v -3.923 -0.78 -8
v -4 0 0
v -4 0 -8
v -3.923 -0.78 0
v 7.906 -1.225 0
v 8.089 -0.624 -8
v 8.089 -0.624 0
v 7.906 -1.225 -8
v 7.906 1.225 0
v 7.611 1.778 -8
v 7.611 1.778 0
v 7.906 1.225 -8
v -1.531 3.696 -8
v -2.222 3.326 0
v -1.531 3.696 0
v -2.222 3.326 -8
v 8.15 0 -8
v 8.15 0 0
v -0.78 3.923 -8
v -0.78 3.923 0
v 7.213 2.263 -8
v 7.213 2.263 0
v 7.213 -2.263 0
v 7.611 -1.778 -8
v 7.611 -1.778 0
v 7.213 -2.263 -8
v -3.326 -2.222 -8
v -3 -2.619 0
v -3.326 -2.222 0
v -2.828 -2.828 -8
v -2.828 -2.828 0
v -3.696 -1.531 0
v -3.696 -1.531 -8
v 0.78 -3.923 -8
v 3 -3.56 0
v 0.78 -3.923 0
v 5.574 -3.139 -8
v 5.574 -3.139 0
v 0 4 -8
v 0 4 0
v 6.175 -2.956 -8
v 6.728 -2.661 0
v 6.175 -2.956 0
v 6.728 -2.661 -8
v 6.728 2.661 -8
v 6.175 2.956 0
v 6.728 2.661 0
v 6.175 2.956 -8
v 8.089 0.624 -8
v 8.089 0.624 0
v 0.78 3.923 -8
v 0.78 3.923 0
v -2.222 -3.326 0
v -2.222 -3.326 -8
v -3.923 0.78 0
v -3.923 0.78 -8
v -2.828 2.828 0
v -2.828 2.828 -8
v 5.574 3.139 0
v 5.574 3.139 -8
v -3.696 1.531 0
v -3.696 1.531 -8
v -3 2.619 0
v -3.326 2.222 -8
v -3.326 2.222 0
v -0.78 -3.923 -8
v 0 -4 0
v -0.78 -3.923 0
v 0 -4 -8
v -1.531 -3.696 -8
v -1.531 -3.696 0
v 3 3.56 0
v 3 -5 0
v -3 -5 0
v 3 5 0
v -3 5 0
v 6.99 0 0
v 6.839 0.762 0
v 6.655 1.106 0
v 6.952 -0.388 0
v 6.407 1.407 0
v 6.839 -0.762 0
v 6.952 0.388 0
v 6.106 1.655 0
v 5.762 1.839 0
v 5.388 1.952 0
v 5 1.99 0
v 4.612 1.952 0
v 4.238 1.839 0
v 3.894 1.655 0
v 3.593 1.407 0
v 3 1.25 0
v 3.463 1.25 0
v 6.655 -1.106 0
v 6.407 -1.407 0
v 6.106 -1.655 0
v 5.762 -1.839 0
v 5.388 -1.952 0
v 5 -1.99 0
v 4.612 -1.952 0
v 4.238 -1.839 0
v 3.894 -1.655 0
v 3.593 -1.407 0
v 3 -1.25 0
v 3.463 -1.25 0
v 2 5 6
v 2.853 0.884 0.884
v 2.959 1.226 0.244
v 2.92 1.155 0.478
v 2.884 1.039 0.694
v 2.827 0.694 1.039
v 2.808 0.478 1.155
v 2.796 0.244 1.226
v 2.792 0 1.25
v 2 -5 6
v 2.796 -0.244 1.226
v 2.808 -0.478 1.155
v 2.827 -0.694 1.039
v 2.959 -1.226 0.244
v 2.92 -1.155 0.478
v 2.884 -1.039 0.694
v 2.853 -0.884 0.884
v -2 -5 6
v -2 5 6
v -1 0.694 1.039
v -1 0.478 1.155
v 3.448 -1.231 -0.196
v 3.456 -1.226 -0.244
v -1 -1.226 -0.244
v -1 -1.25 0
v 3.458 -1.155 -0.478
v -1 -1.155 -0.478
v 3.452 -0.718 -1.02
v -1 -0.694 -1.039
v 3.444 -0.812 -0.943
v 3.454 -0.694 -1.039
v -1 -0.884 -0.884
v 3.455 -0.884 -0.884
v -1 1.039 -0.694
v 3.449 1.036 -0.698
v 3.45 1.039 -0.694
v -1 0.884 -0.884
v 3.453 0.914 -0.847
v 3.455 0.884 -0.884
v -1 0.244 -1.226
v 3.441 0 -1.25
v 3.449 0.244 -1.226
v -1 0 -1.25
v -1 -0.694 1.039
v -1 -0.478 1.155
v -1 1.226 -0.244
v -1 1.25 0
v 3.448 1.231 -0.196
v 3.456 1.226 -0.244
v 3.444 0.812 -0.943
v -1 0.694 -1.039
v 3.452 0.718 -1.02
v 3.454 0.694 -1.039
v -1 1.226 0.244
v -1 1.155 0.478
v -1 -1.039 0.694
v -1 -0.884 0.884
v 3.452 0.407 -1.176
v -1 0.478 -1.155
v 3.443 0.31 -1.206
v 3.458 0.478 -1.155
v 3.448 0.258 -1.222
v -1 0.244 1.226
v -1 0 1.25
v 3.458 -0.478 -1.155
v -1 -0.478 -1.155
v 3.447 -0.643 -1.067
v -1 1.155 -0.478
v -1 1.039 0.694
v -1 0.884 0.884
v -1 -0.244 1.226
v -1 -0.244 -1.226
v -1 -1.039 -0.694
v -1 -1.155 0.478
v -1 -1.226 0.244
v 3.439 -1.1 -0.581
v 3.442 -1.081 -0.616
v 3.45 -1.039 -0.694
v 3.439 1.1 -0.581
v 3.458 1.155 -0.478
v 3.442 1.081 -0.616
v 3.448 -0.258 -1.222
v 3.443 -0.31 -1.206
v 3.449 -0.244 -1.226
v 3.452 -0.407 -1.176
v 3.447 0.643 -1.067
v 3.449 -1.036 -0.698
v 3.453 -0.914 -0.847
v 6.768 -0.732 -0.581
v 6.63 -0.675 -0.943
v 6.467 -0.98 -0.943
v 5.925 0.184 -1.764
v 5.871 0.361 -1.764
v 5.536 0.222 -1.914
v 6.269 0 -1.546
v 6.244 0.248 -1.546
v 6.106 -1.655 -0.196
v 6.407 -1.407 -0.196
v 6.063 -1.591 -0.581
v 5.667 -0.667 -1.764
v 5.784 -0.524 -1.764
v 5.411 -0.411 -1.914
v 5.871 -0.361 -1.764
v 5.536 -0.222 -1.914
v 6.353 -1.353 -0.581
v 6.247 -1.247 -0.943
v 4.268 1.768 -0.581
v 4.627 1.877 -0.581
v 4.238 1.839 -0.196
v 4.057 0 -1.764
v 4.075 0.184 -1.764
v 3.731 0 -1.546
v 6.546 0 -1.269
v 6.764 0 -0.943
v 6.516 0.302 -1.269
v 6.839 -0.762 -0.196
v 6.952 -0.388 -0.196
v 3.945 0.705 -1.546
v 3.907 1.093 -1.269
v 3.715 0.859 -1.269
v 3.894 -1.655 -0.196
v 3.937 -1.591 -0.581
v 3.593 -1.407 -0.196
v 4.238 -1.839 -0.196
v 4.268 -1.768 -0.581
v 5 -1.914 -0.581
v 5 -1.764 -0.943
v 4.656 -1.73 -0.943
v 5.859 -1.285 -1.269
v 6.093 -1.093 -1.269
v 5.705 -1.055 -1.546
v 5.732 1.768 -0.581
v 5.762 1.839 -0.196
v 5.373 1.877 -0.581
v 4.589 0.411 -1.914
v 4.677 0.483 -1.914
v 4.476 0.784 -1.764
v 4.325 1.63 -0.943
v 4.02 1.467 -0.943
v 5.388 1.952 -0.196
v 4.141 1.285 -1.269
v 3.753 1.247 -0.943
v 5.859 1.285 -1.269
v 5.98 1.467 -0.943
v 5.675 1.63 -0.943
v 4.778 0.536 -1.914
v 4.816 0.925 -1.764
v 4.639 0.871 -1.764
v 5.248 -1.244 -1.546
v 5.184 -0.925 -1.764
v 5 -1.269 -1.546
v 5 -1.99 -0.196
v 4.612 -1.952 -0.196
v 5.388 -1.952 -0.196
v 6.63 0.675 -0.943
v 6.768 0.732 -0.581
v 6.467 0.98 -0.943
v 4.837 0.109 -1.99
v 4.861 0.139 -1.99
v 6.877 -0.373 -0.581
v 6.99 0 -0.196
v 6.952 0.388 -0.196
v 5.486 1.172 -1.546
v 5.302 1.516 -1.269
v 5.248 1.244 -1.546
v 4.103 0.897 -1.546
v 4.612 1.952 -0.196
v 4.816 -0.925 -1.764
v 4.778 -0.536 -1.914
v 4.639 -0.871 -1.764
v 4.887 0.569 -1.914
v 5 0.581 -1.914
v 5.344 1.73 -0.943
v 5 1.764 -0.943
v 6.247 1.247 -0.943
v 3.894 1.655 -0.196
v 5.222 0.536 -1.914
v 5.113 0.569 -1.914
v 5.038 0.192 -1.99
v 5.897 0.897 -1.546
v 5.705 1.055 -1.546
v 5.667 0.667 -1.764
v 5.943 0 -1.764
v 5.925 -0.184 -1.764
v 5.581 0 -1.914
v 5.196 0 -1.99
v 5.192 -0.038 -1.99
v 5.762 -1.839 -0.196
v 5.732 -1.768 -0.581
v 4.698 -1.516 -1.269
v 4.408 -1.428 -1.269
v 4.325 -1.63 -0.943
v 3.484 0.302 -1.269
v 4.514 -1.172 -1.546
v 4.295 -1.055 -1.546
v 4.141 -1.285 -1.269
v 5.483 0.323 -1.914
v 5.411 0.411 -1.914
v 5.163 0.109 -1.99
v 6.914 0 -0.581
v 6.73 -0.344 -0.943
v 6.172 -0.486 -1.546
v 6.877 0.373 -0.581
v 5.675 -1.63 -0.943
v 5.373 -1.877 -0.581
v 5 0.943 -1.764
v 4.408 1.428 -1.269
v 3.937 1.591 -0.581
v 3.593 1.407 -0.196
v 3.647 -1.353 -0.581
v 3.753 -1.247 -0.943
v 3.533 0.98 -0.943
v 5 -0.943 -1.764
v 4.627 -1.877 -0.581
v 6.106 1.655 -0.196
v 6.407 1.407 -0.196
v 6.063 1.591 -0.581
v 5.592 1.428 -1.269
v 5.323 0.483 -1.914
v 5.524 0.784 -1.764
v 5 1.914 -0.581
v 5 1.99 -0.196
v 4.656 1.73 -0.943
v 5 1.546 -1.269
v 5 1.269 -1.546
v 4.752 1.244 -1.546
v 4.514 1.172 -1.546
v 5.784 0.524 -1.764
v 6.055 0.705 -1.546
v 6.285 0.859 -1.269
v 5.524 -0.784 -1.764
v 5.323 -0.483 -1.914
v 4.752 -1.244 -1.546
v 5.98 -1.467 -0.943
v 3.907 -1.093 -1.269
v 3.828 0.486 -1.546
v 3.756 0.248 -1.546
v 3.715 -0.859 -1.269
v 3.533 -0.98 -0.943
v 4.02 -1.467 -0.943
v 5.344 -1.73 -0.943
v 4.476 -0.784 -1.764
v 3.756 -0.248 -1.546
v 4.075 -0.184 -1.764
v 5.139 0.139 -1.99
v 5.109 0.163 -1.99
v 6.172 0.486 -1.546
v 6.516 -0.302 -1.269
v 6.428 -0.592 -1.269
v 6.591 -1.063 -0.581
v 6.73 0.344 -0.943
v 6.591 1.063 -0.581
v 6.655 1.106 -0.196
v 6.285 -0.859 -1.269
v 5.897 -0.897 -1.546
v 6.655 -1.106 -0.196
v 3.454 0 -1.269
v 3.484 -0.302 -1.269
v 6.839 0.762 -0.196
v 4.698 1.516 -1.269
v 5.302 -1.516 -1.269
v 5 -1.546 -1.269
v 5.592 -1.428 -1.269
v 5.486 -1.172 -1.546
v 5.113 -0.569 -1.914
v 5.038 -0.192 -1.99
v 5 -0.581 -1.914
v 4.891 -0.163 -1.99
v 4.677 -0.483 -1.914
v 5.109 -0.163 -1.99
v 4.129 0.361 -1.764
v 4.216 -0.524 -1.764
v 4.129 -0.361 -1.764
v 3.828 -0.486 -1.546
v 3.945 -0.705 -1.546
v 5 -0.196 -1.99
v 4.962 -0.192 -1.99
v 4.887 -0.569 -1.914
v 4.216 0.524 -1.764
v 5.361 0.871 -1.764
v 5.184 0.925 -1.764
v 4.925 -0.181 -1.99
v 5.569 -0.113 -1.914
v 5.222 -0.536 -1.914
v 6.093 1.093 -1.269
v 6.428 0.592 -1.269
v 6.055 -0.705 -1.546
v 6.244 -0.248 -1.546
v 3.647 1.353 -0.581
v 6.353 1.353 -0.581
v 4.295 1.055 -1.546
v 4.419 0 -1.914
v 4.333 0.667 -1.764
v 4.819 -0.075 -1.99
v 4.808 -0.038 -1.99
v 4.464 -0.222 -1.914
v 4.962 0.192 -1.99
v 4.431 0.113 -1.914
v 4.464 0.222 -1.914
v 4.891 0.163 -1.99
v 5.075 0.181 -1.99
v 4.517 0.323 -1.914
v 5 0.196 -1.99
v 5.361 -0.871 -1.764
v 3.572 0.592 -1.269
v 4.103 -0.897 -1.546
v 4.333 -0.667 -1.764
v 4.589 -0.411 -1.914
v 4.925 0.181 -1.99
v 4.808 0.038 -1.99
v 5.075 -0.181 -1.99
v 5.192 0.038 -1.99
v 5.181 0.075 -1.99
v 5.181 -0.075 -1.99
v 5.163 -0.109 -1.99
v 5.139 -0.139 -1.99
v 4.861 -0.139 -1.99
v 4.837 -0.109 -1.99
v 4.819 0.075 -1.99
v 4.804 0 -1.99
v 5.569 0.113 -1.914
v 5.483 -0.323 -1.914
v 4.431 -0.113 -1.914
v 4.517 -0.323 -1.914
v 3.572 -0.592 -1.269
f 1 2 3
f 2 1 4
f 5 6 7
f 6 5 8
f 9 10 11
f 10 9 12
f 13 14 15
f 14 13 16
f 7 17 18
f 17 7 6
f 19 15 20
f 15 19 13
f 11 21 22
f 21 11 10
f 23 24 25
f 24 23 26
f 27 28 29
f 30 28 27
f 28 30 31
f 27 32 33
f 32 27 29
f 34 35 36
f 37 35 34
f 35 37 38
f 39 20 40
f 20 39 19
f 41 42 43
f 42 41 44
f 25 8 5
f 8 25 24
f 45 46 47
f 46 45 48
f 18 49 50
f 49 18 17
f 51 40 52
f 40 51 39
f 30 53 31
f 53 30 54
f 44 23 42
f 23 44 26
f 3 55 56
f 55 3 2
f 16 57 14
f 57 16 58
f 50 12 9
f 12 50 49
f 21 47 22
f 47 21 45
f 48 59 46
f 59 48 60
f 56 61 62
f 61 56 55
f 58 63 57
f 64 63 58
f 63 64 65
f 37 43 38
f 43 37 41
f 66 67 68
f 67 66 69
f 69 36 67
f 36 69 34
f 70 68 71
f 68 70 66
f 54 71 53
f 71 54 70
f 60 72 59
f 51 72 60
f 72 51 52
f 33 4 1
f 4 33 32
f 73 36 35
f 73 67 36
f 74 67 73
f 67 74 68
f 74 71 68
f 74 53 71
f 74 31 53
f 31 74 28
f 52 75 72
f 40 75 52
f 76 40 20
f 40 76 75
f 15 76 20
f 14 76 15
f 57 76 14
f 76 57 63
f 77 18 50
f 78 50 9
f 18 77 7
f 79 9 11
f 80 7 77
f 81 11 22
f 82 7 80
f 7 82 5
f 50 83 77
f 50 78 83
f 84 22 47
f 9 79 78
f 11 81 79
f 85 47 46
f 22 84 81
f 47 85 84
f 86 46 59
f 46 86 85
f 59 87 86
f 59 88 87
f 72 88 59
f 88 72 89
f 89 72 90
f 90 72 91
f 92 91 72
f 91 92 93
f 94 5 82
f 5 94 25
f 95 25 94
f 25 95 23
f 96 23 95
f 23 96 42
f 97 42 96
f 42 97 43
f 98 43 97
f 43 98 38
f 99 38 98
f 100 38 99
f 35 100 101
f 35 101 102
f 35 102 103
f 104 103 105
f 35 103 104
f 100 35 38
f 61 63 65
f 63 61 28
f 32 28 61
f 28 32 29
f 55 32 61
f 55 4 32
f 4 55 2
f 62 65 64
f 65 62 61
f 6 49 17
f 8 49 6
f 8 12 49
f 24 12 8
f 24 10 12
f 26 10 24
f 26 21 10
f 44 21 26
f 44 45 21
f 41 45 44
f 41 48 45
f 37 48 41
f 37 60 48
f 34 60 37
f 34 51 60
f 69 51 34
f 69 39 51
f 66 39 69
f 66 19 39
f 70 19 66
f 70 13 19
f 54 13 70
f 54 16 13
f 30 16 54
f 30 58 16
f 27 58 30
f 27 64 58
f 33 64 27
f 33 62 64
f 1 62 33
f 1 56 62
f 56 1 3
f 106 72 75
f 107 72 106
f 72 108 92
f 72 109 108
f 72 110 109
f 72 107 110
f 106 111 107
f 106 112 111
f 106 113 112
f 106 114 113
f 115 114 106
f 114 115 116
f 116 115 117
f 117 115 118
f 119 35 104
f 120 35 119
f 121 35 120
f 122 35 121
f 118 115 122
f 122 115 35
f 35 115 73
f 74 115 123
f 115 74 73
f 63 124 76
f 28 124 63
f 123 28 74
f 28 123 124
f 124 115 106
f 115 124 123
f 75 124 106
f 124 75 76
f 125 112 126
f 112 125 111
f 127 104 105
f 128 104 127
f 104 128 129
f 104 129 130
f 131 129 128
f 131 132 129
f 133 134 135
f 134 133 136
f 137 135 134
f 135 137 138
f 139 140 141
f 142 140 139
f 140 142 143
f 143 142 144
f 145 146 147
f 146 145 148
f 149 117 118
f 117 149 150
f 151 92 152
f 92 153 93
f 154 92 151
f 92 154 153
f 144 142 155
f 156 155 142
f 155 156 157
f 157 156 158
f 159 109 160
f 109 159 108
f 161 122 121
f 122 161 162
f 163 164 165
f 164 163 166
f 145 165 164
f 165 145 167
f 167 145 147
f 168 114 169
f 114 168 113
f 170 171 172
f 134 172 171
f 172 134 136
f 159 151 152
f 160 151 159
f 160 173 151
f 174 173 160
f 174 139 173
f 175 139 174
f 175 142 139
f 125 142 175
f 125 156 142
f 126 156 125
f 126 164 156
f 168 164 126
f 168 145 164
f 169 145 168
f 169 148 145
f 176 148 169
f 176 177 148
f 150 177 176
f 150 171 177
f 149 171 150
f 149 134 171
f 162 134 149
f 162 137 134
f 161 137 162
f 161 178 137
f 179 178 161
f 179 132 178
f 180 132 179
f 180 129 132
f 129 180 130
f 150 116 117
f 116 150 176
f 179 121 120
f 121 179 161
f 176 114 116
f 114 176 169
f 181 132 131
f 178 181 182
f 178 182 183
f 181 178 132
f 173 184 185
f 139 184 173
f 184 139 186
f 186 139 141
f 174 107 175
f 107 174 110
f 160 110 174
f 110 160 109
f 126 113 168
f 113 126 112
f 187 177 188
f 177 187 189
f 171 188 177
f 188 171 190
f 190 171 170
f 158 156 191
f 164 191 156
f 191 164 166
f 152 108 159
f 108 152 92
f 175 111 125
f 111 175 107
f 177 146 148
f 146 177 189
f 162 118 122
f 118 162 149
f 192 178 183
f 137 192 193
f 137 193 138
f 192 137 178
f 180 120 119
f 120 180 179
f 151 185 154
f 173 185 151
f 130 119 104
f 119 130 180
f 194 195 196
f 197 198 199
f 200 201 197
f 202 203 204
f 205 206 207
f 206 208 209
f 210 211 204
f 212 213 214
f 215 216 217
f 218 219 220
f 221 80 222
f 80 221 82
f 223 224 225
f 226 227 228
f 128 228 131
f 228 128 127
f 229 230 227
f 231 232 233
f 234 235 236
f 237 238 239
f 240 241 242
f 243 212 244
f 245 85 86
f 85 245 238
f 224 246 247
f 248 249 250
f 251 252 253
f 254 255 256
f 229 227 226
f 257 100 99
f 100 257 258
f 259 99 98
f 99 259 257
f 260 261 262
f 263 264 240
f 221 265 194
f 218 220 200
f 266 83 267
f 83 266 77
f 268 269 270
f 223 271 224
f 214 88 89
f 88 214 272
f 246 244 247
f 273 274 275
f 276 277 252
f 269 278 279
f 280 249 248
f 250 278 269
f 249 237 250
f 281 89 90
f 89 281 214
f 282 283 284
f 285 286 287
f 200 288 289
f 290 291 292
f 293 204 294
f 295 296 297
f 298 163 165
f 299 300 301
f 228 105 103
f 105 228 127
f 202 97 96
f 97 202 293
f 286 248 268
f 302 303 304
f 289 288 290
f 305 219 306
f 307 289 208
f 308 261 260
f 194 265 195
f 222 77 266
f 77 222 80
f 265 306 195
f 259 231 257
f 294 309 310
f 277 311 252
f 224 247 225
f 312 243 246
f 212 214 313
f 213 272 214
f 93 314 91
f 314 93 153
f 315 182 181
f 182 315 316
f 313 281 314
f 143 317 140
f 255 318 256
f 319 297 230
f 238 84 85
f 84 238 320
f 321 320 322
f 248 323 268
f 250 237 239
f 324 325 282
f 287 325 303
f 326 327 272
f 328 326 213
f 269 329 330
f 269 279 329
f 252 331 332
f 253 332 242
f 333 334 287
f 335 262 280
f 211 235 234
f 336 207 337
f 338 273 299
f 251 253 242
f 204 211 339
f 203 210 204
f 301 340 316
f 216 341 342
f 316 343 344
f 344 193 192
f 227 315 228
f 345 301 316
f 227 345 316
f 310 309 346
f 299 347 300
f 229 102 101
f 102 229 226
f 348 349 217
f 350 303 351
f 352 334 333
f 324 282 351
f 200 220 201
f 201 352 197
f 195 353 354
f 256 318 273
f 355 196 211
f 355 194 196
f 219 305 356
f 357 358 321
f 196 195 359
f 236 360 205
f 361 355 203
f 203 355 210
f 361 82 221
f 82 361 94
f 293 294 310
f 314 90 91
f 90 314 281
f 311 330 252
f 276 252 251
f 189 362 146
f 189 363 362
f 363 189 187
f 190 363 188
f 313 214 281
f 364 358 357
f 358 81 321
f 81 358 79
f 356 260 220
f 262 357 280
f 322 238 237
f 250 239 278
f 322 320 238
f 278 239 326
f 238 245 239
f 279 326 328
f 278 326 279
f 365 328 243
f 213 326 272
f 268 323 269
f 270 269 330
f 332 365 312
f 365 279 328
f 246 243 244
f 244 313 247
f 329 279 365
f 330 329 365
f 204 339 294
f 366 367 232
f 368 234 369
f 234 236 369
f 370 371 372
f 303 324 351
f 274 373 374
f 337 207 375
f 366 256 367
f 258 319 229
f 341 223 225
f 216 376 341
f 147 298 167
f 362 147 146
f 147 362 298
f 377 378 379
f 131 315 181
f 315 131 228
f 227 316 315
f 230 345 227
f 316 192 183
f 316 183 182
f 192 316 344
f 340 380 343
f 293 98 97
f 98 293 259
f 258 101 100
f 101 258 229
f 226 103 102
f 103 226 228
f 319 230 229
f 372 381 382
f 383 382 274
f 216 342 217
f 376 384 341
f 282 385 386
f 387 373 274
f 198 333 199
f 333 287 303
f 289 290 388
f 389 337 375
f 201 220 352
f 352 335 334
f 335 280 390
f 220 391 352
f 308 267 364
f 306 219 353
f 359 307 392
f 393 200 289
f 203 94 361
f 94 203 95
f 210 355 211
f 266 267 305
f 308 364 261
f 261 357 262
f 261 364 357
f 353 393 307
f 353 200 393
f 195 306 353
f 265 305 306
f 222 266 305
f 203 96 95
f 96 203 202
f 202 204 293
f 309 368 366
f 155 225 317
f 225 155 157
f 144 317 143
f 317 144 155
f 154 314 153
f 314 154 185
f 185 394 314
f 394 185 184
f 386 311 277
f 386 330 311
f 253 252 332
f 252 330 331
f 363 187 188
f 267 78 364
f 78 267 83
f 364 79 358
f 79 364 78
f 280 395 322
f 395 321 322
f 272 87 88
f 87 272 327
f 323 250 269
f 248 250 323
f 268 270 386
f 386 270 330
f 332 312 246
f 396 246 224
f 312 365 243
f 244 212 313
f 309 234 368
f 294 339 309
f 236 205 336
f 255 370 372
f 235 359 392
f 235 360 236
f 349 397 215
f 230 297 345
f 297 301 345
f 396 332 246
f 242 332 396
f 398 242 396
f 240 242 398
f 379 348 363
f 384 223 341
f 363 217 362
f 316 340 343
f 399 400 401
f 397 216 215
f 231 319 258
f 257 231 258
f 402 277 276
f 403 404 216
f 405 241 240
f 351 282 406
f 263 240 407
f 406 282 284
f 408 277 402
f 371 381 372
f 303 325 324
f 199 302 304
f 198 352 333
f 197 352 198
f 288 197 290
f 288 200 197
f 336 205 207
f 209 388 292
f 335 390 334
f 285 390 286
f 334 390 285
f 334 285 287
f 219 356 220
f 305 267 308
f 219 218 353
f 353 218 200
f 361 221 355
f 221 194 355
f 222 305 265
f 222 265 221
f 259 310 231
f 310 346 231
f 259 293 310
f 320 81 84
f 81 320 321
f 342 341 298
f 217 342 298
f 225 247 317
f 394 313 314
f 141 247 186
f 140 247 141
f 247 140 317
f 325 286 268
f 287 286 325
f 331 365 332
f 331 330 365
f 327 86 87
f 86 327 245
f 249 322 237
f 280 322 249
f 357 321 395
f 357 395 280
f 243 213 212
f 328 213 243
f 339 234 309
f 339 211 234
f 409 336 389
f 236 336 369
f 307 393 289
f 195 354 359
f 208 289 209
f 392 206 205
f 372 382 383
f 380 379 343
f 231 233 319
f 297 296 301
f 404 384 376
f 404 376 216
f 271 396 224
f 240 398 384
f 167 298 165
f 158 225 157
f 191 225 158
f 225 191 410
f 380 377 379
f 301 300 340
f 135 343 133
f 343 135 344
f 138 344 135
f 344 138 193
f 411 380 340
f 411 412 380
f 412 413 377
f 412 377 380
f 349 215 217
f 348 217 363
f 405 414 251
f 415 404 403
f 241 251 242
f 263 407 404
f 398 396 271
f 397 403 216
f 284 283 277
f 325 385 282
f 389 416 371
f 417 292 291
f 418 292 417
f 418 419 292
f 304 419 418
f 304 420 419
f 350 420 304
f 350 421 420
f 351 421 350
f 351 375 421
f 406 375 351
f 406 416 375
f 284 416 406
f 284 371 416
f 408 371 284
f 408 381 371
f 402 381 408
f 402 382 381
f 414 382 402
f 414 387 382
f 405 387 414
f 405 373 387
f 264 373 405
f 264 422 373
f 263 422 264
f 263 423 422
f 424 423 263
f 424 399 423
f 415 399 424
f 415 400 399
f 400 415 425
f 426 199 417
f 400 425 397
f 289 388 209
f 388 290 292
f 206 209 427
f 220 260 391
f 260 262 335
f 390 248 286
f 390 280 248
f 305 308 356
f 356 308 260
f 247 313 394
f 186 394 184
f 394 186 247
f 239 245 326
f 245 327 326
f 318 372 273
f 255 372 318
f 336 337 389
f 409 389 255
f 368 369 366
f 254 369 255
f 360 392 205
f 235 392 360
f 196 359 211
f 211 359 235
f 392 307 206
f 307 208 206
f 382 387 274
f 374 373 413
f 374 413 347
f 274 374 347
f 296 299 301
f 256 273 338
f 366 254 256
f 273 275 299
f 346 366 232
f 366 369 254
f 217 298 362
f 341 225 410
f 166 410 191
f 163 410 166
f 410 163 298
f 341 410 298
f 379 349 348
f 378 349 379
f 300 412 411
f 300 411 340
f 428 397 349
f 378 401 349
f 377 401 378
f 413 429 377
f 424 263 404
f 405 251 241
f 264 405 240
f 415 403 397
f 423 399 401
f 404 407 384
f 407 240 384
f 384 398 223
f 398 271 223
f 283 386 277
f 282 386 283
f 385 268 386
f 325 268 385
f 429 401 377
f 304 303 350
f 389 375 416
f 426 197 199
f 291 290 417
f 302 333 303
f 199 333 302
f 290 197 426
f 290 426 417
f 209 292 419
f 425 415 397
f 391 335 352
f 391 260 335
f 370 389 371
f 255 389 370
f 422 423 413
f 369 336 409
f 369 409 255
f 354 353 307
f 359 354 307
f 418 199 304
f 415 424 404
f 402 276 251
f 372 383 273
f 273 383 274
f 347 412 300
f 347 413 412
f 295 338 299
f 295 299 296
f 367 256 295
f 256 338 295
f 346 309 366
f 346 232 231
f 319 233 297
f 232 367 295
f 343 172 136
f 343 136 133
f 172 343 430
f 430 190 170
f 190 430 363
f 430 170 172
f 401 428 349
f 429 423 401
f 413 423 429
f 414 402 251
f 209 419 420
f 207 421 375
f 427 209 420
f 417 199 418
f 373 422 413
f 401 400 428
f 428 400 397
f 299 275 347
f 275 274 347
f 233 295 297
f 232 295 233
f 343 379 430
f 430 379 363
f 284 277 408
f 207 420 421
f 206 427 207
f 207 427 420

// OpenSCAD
// COBRA-Snap Finger Segment - distal
// Dovetail slide joints, no glue needed

$fn = 32;

module finger_segment() {
    difference() {
        union() {
            // Main body
            hull() {
                translate([0, 0, -4])
                cylinder(h=8, d=8, center=true);
                
                translate([4.95, 0, -4])
                cylinder(h=8, d=6.4, center=true);
            }
            
            // Male dovetail (proximal end)
            translate([0, 0, 0])
            rotate([90, 0, 0])
            linear_extrude(height=10, center=true)
            polygon(points=[[-3, 0], [3, 0], [2, 6], [-2, 6]]);
        }
        
        // Female dovetail socket (distal end) - skip for distal
        
        
        // Tendon channel
        translate([2.475, 0, 0])
        rotate([0, 90, 0])
        cylinder(h=6.95, d=2.5, center=true);
        
        // Quick-connect socket for tendon
        translate([5, 0, 0])
        sphere(d=4);
    }
}

finger_segment();
